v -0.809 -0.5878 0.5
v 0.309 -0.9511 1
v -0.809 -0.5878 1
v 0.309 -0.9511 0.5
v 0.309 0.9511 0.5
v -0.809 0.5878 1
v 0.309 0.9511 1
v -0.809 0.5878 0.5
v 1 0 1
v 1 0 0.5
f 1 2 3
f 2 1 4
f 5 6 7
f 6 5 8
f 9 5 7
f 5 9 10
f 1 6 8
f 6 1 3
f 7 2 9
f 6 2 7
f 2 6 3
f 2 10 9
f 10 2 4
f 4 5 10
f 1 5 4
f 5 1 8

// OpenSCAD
// file: ../SRC/polyScrewThread_r1.scad
/*
 *    polyScrewThread_r1.scad    by aubenc @ Thingiverse
 *
 * This script contains the library modules that can be used to generate
 * threaded rods, screws and nuts.
 *
 * http://www.thingiverse.com/thing:8796
 *
 * CC Public Domain
 */


/* Example:
 * Just a 100mm long threaded rod.
 *
 * screw_thread(15,   // Outer diameter of the thread
 *               4,   // Step, traveling length per turn, also, tooth height, whatever...
 *              55,   // Degrees for the shape of the tooth 
 *                       (XY plane = 0, Z = 90, btw, 0 and 90 will/should not work...)
 *             100,   // Length (Z) of the tread
 *            PI/2,   // Resolution, one face each "PI/2" mm of the perimeter, 
 *               0);  // Countersink style:
 *                         -2 - Not even flat ends
 *                         -1 - Bottom (countersink'd and top flat)
 *                          0 - None (top and bottom flat)
 *                          1 - Top (bottom flat)
 *                          2 - Both (countersink'd)
 */
module screw_thread(od,st,lf0,lt,rs,cs)
{
    or=od/2;
    ir=or-st/2*cos(lf0)/sin(lf0);
    pf=2*PI*or;
    sn=floor(pf/rs);
    lfxy=360/sn;
    ttn=round(lt/st+1);
    zt=st/sn;

    intersection()
    {
        if (cs >= -1)
        {
           thread_shape(cs,lt,or,ir,sn,st);
        }

        full_thread(ttn,st,sn,zt,lfxy,or,ir);
    }
}

/* Example.
 * A nut for the thread rod example.
 *
 * hexa_nut(24,  // Distance between flats
 *           8,  // Height 
 *           4,  // Step height (the half will be used to countersink the ends)
 *          55,  // Degrees (same as used for the screw_thread example)
 *          15,  // Outer diameter of the thread to match
 *         0.5)  // Resolution, you may want to set this to small values
 *                  (quite high res) to minimize overhang issues
 *
 */
module hex_nut(df,hg,sth,clf,cod,crs)
{

    difference()
    {
        hex_head(hg,df);

        hex_countersink_ends(sth/2,cod,clf,crs,hg);

        screw_thread(cod,sth,clf,hg,crs,-2);
    }
}


module hex_screw(od,st,lf0,lt,rs,cs,df,hg,ntl,ntd)
{
    ntr=od/2-(st/2)*cos(lf0)/sin(lf0);

    union()
    {
        hex_head(hg,df);

        translate([0,0,hg])
        if ( ntl == 0 )
        {
            cylinder(h=0.01, r=ntr, center=true);
        }
        else
        {
            if ( ntd == -1 )
            {
                cylinder(h=ntl+0.01, r=ntr, $fn=floor(od*PI/rs), center=false);
            }
            else if ( ntd == 0 )
            {
                union()
                {
                    cylinder(h=ntl-st/2,
                             r=od/2, $fn=floor(od*PI/rs), center=false);

                    translate([0,0,ntl-st/2])
                    cylinder(h=st/2,
                             r1=od/2, r2=ntr, 
                             $fn=floor(od*PI/rs), center=false);
                }
            }
            else
            {
                cylinder(h=ntl, r=ntd/2, $fn=ntd*PI/rs, center=false);
            }
        }

        translate([0,0,ntl+hg]) screw_thread(od,st,lf0,lt,rs,cs);
    }
}

module hex_screw_0(od,st,lf0,lt,rs,cs,df,hg,ntl,ntd)
{
    ntr=od/2-(st/2)*cos(lf0)/sin(lf0);

    union()
    {
        hex_head_0(hg,df);

        translate([0,0,hg])
        if ( ntl == 0 )
        {
            cylinder(h=0.01, r=ntr, center=true);
        }
        else
        {
            if ( ntd == -1 )
            {
                cylinder(h=ntl+0.01, r=ntr, $fn=floor(od*PI/rs), center=false);
            }
            else if ( ntd == 0 )
            {
                union()
                {
                    cylinder(h=ntl-st/2,
                             r=od/2, $fn=floor(od*PI/rs), center=false);

                    translate([0,0,ntl-st/2])
                    cylinder(h=st/2,
                             r1=od/2, r2=ntr, 
                             $fn=floor(od*PI/rs), center=false);
                }
            }
            else
            {
                cylinder(h=ntl, r=ntd/2, $fn=ntd*PI/rs, center=false);
            }
        }

        translate([0,0,ntl+hg]) screw_thread(od,st,lf0,lt,rs,cs);
    }
}

module thread_shape(cs,lt,or,ir,sn,st)
{
    if ( cs == 0 )
    {
        cylinder(h=lt, r=or, $fn=sn, center=false);
    }
    else
    {
        union()
        {
            translate([0,0,st/2])
              cylinder(h=lt-st+0.005, r=or, $fn=sn, center=false);

            if ( cs == -1 || cs == 2 )
            {
                cylinder(h=st/2, r1=ir, r2=or, $fn=sn, center=false);
            }
            else
            {
                cylinder(h=st/2, r=or, $fn=sn, center=false);
            }

            translate([0,0,lt-st/2])
            if ( cs == 1 || cs == 2 )
            {
                  cylinder(h=st/2, r1=or, r2=ir, $fn=sn, center=false);
            }
            else
            {
                cylinder(h=st/2, r=or, $fn=sn, center=false);
            }
        }
    }
}

module full_thread(ttn,st,sn,zt,lfxy,or,ir)
{
  if(ir >= 0.2)
  {
    for(i=[0:ttn-1])
    {
        for(j=[0:sn-1])
			assign( pt = [	[0,                  0,                  i*st-st            ],
                        [ir*cos(j*lfxy),     ir*sin(j*lfxy),     i*st+j*zt-st       ],
                        [ir*cos((j+1)*lfxy), ir*sin((j+1)*lfxy), i*st+(j+1)*zt-st   ],
								[0,0,i*st],
                        [or*cos(j*lfxy),     or*sin(j*lfxy),     i*st+j*zt-st/2     ],
                        [or*cos((j+1)*lfxy), or*sin((j+1)*lfxy), i*st+(j+1)*zt-st/2 ],
                        [ir*cos(j*lfxy),     ir*sin(j*lfxy),     i*st+j*zt          ],
                        [ir*cos((j+1)*lfxy), ir*sin((j+1)*lfxy), i*st+(j+1)*zt      ],
                        [0,                  0,                  i*st+st            ]	])
        {
            polyhedron(points=pt,
              		  triangles=[	[1,0,3],[1,3,6],[6,3,8],[1,6,4],
											[0,1,2],[1,4,2],[2,4,5],[5,4,6],[5,6,7],[7,6,8],
											[7,8,3],[0,2,3],[3,2,7],[7,2,5]	]);
        }
    }
  }
  else
  {
    echo("Step Degrees too agresive, the thread will not be made!!");
    echo("Try to increase de value for the degrees and/or...");
    echo(" decrease the pitch value and/or...");
    echo(" increase the outer diameter value.");
  }
}

module hex_head(hg,df)
{
	rd0=df/2/sin(60);
	x0=0;	x1=df/2;	x2=x1+hg/2;
	y0=0;	y1=hg/2;	y2=hg;

	intersection()
	{
	   cylinder(h=hg, r=rd0, $fn=6, center=false);

		rotate_extrude(convexity=10, $fn=6*round(df*PI/6/0.5))
		polygon([ [x0,y0],[x1,y0],[x2,y1],[x1,y2],[x0,y2] ]);
	}
}

module hex_head_0(hg,df)
{
    cylinder(h=hg, r=df/2/sin(60), $fn=6, center=false);
}

module hex_countersink_ends(chg,cod,clf,crs,hg)
{
    translate([0,0,-0.1])
    cylinder(h=chg+0.01, 
             r1=cod/2, 
             r2=cod/2-(chg+0.1)*cos(clf)/sin(clf),
             $fn=floor(cod*PI/crs), center=false);

    translate([0,0,hg-chg+0.1])
    cylinder(h=chg+0.01, 
             r1=cod/2-(chg+0.1)*cos(clf)/sin(clf),
             r2=cod/2, 
             $fn=floor(cod*PI/crs), center=false);
}
// file: ../SRC/WINDGAUGE02A_S03.scad
$fn=40; // model faces resolution.
include <../configuration.scad>

use <zavity.scad>

module WINDGAUGE02A_S03(S01_sila_materialu,S01_vyska_komponentu_na_lozisko,S01_prumer_zavitu,lozisko_vyska,lozisko_prumer_vnejsi,lozisko_prumer_vnitrni,lozisko_prekryv,vyska_matky,prumer_orechu,prumer_sroubu,vyska_hlavy_sroubu,prumer_hlavy_sroubu)
    {

difference()
        {
//translate([0,0,-(S01_vyska_na_elektroniku+S01_vyska_zavitu_na_nasroubovani_drzaku+2*S01_vyska_komponentu_na_lozisko)/2-10])
    
metric_thread (diameter=S01_prumer_zavitu-0.3, pitch=1, length=S01_vyska_komponentu_na_lozisko, internal=false, n_starts=6);

//otvory na ložisko
translate([0,0,lozisko_vyska/2])
 cylinder (h = lozisko_vyska+0.01, r=(lozisko_prumer_vnejsi+0.2)/2, center = true, $fn=100);
 
 translate([0,0,S01_vyska_komponentu_na_lozisko/2])           
  cylinder (h = S01_vyska_komponentu_na_lozisko+0.01, r=(lozisko_prumer_vnitrni+2*lozisko_prekryv+0.2)/2, center = true, $fn=100);


//otvor na šroub 1
translate([-senzor_delka/2,-senzor_sirka/2,vyska_hlavy_sroubu/2])
 cylinder (h = vyska_hlavy_sroubu+0.01, r=(prumer_hlavy_sroubu+0.2)/2, center = true, $fn=100);
 
 translate([-senzor_delka/2,-senzor_sirka/2,S01_vyska_komponentu_na_lozisko/2])           
  cylinder (h = S01_vyska_komponentu_na_lozisko+0.01, r=(prumer_sroubu)/2, center = true, $fn=100);
            
//otvor na šroub 2
translate([senzor_delka/2,-senzor_sirka/2,vyska_hlavy_sroubu/2])
 cylinder (h = vyska_hlavy_sroubu+0.01, r=(prumer_hlavy_sroubu+0.2)/2, center = true, $fn=100);
 
 translate([senzor_delka/2,-senzor_sirka/2,S01_vyska_komponentu_na_lozisko/2])           
  cylinder (h = S01_vyska_komponentu_na_lozisko+0.01, r=(prumer_sroubu)/2, center = true, $fn=100);            
            
//otvor na šroub 3
translate([senzor_delka/2,senzor_sirka/2,vyska_hlavy_sroubu/2])
 cylinder (h = vyska_hlavy_sroubu+0.01, r=(prumer_hlavy_sroubu+0.2)/2, center = true, $fn=100);
 
 translate([senzor_delka/2,senzor_sirka/2,S01_vyska_komponentu_na_lozisko/2])           
  cylinder (h = S01_vyska_komponentu_na_lozisko+0.01, r=(prumer_sroubu)/2, center = true, $fn=100); 

//otvor na šroub 4
translate([-senzor_delka/2,senzor_sirka/2,vyska_hlavy_sroubu/2])
 cylinder (h = vyska_hlavy_sroubu+0.01, r=(prumer_hlavy_sroubu+0.2)/2, center = true, $fn=100);
 
 translate([-senzor_delka/2,senzor_sirka/2,S01_vyska_komponentu_na_lozisko/2])           
  cylinder (h = S01_vyska_komponentu_na_lozisko+0.01, r=(prumer_sroubu)/2, center = true, $fn=100); 

 }
    }
 



    

    
 WINDGAUGE02A_S03(S01_sila_materialu,S01_vyska_komponentu_na_lozisko,S01_prumer_zavitu,lozisko_vyska,lozisko_prumer_vnejsi,lozisko_prumer_vnitrni,lozisko_prekryv,vyska_matky,prumer_orechu,prumer_sroubu,vyska_hlavy_sroubu,prumer_hlavy_sroubu);   
// file: ../configuration.scad
$fn=40; // model faces resolution.

//OBECNE PARAMETRY 
//----------------------------------------------------------------
//----------------------------------------------------------------
//WINDGAUGE02A_S02 - Parametry pro hlavni valec anemometru
S01_hloubka_zavitu=4;
S01_vyska=80; //80
S01_prumer_vnitrni=60;
S01_sila_materialu=1.3;
S01_vyska_horni_zavit=10;
S01_vyska_spodniho_zavitu=10;
S01_sila_drzaku_RJ11=3; //vyška drážky
S01_hrana_A_RJ11=12.3;
S01_hrana_B_RJ11=19;
S01_tolerance_zavit=1.5;

//Rozměry ložiska se závity
LO_spodni_prumer=50;
LO_doraz_prumer=55;
LO_horni_prumer=10;
LO_vyska_spodni_doraz=5;
LO_vyska_horni_doraz=10;
LO_vyska_dorazu=3;



//Obecné parametry
prumer_osicky=5.1;

//Rozmery modulu se senzorem
senzor_delka=22;
senzor_sirka=20.4;
senzor_sila=2;


//Parametry loziska
lozisko_prumer_vnitrni=4.9;
lozisko_prumer_vnejsi=16.1;
lozisko_vyska=5;
lozisko_prekryv=1.5;

//Parametry magnetu
magnet_prumer=6.3;
magnet_vyska=5;
magnet_zapusteni=2;
magnet_tolerance_prumeru=0.2;

//Parametry sroubu
prumer_sroubu=3.4;
prumer_hlavy_sroubu=6;
vyska_hlavy_sroubu=4;
vyska_matky=3;
sirka_matky=6.7;

sirka_matky_tol=0.175;
prumer_orechu=10;

//WINDGAUGE02A_R01 //pro lopatku
L01_hrana_drzaku_a=10;
L01_hrana_drzaku_b=3;
L01_delka_uchytu=19;
L01_prumer_lopatky=40;
L01_sila_materialu_lopatky=0.9;

//WINDGAUGE02A_D01 //uchyt velky
D01_material_pod_zavitem=3;
D01_material_za_zavitem=3;
D01_material_pred_zavitem=2;
D01_delka_tyce=40;
D01_sirka_tyce=10;

//WINDGAUGE02A_D02 //uchyt na sloup
D02_sila_materialu=2;
D02_vyska_uchytky=40;
D02_prumer_obruby=28;
D02_delka_celeho_uchytu=70;
D02_dotahova_vzdalenost=1.5;
D02_prumer_uchytneho_sroubu=6.2;

//WINDGAUGE02A_R01 //rotor s prekritim statoru
R01_vyska_preryti_statoru=10;
R01_sila_materialu_pro_prekriti=1.3;
R01_mezera_mezi_statorem_rotorem=3;

//WINDGAUGE02A_R03 //drzak magnetu
R05_sirka_matky=10;



R03_prumer_zavitu=40;
R04_zavit_vyska=5;
R02_zavit_vyska=10;
R01_zavit_vyska=5;
R03_mezera_mezi_statorem_rotorem=3;
// main file
$fn=100; // model faces resolution.
include <../configuration.scad>

use <../SRC/WINDGAUGE02A_S03.scad>
use <../SRC/polyScrewThread_r1.scad>

translate([0,0,0])
    rotate([0, 0, 0])
        WINDGAUGE02A_S03();   
